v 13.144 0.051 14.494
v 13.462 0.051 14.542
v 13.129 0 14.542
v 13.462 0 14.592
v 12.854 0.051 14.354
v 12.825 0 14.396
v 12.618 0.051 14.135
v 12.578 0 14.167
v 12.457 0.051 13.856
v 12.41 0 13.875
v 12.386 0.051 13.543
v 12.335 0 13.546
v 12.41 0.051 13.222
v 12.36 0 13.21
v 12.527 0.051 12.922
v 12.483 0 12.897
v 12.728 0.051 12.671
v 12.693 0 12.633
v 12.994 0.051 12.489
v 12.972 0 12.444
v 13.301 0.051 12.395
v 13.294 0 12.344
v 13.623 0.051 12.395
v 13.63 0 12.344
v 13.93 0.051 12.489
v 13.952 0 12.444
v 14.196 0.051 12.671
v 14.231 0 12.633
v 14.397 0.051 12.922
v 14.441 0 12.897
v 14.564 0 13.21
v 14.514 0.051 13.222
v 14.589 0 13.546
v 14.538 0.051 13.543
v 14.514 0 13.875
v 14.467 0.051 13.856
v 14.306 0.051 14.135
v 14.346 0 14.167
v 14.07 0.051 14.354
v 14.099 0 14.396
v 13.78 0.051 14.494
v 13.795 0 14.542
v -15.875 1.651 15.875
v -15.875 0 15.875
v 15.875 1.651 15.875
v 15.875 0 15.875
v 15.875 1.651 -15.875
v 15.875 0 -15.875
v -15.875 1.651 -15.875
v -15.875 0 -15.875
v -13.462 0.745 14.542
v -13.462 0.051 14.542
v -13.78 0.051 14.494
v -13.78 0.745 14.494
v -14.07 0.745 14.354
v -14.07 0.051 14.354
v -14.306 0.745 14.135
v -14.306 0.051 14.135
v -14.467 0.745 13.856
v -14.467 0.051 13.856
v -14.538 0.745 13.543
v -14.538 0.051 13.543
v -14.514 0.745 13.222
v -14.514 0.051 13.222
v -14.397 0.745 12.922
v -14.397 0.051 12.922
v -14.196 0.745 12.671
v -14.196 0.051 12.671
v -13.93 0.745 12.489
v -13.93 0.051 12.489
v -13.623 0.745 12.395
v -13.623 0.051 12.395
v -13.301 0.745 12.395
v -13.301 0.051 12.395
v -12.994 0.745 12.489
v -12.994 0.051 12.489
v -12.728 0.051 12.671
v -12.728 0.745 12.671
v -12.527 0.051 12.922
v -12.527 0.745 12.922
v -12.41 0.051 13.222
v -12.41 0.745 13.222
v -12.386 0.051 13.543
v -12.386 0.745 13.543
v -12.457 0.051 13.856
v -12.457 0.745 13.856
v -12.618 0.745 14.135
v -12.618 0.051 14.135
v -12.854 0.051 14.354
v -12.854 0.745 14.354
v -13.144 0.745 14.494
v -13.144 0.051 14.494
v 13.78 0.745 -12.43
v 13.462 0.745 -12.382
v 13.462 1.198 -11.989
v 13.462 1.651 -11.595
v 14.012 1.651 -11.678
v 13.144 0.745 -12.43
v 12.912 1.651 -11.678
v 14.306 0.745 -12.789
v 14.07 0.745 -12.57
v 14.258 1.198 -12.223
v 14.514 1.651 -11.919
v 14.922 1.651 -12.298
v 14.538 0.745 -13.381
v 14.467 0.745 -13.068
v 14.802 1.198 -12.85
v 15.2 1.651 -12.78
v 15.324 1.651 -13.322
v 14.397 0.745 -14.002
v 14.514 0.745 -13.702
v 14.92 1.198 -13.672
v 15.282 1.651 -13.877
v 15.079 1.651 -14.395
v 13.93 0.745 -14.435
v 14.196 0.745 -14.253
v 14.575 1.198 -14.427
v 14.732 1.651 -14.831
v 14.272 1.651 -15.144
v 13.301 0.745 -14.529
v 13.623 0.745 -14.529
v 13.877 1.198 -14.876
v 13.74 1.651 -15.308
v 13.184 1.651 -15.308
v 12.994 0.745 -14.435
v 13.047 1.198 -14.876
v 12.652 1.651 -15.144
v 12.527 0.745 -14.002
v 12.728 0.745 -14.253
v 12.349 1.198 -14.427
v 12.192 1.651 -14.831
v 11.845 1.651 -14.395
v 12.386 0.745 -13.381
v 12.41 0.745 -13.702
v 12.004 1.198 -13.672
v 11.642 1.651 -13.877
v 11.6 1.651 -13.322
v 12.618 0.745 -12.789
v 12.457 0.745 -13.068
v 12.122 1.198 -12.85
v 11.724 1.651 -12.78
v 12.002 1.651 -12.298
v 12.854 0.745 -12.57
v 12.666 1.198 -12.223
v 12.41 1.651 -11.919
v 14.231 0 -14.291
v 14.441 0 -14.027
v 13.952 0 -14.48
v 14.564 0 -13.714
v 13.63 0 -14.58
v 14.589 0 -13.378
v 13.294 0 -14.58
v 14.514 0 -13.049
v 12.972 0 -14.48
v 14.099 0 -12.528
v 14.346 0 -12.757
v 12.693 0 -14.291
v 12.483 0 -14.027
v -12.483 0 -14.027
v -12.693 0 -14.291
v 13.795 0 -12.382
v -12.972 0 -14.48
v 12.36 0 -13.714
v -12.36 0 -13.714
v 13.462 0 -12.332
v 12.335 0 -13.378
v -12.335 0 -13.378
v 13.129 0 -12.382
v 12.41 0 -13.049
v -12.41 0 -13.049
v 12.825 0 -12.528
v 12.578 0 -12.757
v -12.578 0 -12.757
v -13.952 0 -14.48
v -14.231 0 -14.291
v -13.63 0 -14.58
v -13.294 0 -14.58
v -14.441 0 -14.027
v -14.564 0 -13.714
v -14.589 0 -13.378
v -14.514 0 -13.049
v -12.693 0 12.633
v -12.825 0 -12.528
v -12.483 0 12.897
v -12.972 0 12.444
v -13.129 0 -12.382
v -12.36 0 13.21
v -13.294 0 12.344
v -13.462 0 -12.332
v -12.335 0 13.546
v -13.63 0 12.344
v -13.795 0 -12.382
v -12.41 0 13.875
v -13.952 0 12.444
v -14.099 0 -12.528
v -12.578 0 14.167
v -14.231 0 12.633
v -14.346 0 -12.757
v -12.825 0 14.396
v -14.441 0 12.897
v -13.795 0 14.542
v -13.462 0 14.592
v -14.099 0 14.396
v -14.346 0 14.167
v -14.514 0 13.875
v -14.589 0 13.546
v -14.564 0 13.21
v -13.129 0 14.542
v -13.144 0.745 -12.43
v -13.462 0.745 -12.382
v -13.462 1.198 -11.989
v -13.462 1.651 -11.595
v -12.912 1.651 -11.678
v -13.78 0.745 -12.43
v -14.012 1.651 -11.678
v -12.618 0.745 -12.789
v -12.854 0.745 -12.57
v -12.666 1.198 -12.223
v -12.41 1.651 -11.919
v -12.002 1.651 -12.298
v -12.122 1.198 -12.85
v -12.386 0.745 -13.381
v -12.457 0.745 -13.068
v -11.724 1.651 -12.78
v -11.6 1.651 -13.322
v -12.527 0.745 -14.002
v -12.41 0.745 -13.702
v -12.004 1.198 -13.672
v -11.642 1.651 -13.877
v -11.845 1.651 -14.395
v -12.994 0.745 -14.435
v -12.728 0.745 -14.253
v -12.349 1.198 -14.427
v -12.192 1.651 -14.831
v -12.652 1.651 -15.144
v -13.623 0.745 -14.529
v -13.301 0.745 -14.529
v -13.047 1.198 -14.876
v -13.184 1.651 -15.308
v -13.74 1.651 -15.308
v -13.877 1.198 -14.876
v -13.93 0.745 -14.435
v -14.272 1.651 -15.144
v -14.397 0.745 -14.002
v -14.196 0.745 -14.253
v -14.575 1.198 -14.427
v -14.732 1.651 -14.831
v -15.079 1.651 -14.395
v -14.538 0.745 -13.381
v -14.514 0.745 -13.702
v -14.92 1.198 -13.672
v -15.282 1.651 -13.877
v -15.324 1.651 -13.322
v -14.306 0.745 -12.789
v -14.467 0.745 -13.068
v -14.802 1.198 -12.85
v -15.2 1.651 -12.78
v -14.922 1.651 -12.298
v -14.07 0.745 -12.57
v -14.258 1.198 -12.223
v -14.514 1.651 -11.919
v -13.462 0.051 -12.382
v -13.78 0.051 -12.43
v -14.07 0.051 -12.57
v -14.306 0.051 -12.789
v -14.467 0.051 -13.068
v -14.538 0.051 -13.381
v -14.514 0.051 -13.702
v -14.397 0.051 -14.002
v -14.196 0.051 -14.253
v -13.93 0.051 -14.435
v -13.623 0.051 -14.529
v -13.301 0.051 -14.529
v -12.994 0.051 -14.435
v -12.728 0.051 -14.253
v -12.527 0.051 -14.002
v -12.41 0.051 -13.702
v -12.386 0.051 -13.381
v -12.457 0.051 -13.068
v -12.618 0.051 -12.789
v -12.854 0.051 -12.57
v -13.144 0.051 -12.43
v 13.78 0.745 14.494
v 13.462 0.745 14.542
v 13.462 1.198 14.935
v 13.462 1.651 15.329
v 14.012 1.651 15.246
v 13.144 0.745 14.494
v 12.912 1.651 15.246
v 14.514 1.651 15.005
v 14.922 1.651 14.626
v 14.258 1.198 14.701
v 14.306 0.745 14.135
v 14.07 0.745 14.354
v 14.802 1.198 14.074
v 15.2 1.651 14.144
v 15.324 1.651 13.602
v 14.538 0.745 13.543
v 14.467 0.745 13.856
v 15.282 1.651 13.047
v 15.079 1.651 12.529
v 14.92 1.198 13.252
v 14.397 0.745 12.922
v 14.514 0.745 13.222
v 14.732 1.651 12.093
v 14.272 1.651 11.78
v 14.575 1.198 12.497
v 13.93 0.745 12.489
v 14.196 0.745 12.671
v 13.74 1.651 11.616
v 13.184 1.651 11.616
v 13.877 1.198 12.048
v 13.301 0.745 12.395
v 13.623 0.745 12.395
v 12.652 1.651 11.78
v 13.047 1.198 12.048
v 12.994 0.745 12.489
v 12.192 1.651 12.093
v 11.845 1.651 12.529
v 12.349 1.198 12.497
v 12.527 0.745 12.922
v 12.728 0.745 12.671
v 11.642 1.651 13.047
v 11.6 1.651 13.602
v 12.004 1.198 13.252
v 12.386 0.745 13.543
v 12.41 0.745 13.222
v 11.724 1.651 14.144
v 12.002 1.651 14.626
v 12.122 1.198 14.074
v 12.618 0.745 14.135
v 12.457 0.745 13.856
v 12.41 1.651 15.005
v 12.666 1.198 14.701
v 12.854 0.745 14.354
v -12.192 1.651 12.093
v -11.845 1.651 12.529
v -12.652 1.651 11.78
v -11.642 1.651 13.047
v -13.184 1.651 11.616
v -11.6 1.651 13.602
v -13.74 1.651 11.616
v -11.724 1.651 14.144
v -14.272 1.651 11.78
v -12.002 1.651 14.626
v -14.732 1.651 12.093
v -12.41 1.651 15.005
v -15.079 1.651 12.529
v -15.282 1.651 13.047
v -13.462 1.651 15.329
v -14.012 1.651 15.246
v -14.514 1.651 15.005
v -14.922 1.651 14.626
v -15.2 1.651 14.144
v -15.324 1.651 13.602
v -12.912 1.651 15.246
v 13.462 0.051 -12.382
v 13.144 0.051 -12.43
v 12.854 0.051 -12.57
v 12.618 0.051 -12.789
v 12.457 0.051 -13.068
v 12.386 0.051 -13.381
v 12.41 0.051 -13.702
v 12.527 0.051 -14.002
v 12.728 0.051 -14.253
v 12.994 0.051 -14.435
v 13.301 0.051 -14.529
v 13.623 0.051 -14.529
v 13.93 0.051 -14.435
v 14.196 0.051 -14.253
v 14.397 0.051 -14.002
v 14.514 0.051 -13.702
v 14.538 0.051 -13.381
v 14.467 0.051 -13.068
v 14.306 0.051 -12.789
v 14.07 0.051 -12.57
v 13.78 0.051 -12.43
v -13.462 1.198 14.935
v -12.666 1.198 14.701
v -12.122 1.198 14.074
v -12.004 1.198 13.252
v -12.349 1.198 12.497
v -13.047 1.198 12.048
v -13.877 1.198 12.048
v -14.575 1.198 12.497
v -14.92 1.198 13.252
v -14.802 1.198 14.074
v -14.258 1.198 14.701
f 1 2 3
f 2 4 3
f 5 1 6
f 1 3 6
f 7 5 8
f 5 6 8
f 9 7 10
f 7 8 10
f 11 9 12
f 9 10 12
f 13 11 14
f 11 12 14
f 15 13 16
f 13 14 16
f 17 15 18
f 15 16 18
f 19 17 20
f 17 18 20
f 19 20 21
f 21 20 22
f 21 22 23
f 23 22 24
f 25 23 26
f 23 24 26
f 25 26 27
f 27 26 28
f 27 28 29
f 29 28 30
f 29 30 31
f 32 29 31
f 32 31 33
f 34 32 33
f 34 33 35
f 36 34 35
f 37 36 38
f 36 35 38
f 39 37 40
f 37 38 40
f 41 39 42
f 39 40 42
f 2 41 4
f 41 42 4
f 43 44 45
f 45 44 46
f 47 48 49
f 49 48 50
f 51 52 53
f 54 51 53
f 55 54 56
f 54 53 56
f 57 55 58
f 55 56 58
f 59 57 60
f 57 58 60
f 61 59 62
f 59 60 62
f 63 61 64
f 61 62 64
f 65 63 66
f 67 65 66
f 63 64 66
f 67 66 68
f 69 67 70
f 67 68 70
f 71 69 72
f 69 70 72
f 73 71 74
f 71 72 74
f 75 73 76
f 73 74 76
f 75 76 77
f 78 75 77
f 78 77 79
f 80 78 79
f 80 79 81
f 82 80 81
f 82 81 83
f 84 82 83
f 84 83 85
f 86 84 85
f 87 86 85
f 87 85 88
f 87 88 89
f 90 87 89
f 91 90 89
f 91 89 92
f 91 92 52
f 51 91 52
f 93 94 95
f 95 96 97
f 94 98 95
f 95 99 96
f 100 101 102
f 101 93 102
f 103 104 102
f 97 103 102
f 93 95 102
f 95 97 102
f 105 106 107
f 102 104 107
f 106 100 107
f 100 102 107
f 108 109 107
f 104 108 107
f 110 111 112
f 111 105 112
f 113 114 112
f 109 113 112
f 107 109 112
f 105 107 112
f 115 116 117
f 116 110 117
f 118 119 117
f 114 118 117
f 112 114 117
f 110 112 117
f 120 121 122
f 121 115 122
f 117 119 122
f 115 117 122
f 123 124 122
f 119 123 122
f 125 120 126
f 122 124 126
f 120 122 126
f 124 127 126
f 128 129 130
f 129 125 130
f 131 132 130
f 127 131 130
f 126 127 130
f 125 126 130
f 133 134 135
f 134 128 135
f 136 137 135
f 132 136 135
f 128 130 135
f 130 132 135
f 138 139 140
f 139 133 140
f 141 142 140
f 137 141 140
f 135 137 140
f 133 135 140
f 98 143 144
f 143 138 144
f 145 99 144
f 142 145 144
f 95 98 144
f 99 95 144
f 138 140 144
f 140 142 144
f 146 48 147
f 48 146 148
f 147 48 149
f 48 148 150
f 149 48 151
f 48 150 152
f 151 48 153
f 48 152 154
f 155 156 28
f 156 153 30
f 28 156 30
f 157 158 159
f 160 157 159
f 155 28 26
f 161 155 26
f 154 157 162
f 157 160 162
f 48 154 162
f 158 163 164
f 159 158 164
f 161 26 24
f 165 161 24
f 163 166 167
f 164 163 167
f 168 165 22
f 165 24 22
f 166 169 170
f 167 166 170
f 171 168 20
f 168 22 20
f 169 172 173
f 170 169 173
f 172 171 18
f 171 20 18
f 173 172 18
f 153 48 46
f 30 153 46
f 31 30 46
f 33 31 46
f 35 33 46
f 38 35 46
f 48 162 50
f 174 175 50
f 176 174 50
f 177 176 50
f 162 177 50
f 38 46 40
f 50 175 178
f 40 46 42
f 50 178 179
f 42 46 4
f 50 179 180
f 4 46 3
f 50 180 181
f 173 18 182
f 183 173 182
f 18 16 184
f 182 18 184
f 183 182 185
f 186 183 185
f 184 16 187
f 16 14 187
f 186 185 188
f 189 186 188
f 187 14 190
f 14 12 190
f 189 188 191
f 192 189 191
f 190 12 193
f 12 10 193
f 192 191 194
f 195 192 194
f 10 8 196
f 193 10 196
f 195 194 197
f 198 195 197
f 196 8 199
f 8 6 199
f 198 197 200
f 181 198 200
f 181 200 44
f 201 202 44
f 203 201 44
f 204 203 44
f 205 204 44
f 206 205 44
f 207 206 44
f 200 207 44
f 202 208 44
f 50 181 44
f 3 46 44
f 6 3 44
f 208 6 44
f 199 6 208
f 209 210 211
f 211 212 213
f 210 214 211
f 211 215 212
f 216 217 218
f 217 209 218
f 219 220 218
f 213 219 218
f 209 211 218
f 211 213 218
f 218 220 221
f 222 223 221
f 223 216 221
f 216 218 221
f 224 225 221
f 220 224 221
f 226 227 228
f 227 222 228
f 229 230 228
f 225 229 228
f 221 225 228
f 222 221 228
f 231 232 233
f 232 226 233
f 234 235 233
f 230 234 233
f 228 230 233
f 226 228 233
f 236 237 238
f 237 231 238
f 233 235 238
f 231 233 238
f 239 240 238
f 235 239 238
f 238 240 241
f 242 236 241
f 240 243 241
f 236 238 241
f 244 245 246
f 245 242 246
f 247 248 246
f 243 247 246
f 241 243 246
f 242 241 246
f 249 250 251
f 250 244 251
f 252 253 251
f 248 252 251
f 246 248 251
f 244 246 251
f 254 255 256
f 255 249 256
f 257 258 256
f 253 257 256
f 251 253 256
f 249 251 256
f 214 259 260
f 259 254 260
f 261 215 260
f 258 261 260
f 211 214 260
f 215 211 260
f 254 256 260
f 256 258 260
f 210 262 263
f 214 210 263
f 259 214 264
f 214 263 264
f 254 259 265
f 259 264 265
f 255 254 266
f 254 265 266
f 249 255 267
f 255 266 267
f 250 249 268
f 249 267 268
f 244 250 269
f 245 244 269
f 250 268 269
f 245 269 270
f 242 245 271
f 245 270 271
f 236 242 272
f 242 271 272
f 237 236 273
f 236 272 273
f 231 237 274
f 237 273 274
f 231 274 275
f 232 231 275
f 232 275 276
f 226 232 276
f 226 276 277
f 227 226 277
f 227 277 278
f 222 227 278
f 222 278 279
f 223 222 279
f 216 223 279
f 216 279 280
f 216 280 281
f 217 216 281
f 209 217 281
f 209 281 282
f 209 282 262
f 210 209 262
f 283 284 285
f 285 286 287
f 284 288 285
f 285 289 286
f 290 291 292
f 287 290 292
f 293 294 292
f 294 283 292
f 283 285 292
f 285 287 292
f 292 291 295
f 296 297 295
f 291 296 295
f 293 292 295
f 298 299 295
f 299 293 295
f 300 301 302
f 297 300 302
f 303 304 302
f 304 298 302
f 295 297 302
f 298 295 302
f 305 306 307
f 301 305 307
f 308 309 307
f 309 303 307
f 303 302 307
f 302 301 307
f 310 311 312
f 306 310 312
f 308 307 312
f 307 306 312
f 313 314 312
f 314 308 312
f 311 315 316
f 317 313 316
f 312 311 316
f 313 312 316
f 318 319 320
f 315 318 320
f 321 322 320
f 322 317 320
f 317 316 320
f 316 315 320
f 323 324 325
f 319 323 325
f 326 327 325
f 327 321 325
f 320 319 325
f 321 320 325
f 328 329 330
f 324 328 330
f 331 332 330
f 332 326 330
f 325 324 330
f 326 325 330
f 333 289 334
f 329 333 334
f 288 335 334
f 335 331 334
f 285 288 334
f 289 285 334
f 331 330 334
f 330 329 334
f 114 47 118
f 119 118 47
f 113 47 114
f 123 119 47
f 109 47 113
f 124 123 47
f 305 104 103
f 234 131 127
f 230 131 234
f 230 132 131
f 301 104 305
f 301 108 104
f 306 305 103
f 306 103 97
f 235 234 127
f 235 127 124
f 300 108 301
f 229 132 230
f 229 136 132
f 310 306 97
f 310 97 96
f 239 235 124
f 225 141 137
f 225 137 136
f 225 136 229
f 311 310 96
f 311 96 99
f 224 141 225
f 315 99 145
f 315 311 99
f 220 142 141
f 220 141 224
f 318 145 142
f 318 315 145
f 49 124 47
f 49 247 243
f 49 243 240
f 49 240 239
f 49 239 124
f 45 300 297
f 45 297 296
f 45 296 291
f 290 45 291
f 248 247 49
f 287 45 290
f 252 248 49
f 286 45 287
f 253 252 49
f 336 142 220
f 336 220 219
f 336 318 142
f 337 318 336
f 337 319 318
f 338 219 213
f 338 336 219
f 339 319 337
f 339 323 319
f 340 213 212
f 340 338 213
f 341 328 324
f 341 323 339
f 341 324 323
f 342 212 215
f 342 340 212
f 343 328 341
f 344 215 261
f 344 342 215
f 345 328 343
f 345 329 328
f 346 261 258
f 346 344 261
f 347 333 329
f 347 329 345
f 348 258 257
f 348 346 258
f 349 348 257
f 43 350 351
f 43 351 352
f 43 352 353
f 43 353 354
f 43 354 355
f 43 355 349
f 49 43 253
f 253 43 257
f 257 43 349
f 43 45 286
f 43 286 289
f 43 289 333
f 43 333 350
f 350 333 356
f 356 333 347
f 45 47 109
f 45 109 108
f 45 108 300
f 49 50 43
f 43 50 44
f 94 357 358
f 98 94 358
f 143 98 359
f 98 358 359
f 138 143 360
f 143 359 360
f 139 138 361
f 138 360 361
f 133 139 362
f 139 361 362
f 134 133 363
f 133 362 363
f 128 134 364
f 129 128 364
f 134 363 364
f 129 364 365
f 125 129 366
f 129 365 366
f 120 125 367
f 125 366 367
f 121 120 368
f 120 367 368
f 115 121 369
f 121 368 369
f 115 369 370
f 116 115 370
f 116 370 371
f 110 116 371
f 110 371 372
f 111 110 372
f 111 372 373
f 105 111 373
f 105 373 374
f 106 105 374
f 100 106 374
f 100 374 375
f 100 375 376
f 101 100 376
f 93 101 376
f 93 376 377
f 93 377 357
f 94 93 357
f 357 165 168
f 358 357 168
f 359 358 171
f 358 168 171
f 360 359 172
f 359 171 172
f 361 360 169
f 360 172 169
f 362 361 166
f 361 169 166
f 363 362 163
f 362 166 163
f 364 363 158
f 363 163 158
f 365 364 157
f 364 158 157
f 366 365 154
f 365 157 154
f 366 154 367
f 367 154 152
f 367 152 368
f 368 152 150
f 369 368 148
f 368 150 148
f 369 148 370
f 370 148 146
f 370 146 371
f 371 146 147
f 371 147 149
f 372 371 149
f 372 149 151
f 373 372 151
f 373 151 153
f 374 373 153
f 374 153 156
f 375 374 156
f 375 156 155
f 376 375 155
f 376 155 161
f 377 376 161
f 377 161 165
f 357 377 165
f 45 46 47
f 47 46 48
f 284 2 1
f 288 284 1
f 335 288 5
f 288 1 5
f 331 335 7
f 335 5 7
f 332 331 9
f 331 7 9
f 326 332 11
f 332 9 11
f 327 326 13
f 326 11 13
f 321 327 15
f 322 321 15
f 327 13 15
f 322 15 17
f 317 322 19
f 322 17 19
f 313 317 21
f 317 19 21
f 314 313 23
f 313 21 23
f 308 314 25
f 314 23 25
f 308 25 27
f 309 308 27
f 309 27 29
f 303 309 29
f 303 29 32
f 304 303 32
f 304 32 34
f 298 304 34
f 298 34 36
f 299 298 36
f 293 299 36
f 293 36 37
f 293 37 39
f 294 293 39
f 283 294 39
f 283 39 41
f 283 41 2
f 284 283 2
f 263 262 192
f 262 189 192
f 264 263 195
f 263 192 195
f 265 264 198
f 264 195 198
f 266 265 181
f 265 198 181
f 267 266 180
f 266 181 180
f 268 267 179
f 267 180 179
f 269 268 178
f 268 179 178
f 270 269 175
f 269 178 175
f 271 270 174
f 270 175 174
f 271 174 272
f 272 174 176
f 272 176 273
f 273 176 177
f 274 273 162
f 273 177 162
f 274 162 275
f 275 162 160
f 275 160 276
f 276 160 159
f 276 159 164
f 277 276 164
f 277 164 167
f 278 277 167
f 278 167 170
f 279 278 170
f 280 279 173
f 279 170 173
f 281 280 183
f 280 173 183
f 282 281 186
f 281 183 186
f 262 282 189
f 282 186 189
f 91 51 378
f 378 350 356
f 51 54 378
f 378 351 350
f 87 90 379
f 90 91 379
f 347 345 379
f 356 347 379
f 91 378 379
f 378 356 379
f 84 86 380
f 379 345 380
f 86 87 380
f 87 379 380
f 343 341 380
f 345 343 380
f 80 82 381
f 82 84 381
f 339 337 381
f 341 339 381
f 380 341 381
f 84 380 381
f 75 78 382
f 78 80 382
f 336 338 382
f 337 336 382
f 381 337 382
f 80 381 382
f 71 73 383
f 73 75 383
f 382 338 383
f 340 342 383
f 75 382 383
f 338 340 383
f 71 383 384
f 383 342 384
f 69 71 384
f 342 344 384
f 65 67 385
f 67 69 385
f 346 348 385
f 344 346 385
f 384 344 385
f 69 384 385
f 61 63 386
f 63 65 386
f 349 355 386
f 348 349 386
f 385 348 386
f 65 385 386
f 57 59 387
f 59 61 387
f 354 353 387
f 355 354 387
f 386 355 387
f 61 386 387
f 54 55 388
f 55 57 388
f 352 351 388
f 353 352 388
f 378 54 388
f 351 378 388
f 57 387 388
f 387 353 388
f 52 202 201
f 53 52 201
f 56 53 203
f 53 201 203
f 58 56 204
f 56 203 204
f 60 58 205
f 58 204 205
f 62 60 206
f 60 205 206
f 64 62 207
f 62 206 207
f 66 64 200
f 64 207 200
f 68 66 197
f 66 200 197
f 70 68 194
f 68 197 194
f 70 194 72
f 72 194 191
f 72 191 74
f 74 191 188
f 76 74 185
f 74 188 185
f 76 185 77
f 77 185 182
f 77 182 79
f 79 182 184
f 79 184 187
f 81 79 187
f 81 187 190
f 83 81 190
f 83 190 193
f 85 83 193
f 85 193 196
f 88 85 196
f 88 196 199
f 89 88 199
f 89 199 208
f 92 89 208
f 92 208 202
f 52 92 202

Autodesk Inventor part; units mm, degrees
ref_plane "YZ Plane" through (0, 0, 0) normal (1, 0, 0) x (0, 1, 0)
ref_plane "XZ Plane" through (0, 0, 0) normal (0, 1, 0) x (-1, 0, 0)
ref_plane "XY Plane" through (0, 0, 0) normal (0, 0, 1) x (1, 0, 0)
sketch "Sketch1" plane through (0, 0, 0) normal (0, 1, 0) x (-1, 0, 0)
  line L0 (-15.875, -15.875) -> (15.875, -15.875)
  line L1 (15.875, -15.875) -> (15.875, 15.875)
  line L2 (15.875, 15.875) -> (-15.875, 15.875)
  line L3 (-15.875, 15.875) -> (-15.875, -15.875)
  line L4 (-15.875, -15.875) -> (15.875, 15.875) construction
  line L5 (15.875, -15.875) -> (-15.875, 15.875) construction
  point P0 (0, 0)
  point P1 (0, 0)
  dimension "d0" = 31.75
  dimension "d1" = 31.75
extrude "Extrusion1" add sketch "Sketch1" along normal blind 1.651
hole "Hole1" at (-13.462, 1.651, 13.462) direction (0, -1, 0) diameter 2.159 depth 1.651 tip angle 118 countersink diameter 3.7338 countersink angle 82
hole "Hole2" at (-13.462, 1.651, -13.462) direction (0, -1, 0) diameter 2.159 depth 1.651 tip angle 118 countersink diameter 3.7338 countersink angle 82
hole "Hole3" at (13.462, 1.651, -13.462) direction (0, -1, 0) diameter 2.159 depth 1.651 tip angle 118 countersink diameter 3.7338 countersink angle 82
hole "Hole4" at (13.462, 1.651, 13.462) direction (0, -1, 0) diameter 2.159 depth 1.651 tip angle 118 countersink diameter 3.7338 countersink angle 82
chamfer "Chamfer1" distance 0.0508 angle 45 1 edges at (-13.462, 0, 12.3825)
chamfer "Chamfer2" distance 0.0508 angle 45 1 edges at (13.462, 0, 12.3825)
chamfer "Chamfer3" distance 0.0508 angle 45 1 edges at (13.462, 0, -14.5415)
chamfer "Chamfer4" distance 0.0508 angle 45 1 edges at (-13.462, 0, -14.5415)
properties part number "Housing_Top"
